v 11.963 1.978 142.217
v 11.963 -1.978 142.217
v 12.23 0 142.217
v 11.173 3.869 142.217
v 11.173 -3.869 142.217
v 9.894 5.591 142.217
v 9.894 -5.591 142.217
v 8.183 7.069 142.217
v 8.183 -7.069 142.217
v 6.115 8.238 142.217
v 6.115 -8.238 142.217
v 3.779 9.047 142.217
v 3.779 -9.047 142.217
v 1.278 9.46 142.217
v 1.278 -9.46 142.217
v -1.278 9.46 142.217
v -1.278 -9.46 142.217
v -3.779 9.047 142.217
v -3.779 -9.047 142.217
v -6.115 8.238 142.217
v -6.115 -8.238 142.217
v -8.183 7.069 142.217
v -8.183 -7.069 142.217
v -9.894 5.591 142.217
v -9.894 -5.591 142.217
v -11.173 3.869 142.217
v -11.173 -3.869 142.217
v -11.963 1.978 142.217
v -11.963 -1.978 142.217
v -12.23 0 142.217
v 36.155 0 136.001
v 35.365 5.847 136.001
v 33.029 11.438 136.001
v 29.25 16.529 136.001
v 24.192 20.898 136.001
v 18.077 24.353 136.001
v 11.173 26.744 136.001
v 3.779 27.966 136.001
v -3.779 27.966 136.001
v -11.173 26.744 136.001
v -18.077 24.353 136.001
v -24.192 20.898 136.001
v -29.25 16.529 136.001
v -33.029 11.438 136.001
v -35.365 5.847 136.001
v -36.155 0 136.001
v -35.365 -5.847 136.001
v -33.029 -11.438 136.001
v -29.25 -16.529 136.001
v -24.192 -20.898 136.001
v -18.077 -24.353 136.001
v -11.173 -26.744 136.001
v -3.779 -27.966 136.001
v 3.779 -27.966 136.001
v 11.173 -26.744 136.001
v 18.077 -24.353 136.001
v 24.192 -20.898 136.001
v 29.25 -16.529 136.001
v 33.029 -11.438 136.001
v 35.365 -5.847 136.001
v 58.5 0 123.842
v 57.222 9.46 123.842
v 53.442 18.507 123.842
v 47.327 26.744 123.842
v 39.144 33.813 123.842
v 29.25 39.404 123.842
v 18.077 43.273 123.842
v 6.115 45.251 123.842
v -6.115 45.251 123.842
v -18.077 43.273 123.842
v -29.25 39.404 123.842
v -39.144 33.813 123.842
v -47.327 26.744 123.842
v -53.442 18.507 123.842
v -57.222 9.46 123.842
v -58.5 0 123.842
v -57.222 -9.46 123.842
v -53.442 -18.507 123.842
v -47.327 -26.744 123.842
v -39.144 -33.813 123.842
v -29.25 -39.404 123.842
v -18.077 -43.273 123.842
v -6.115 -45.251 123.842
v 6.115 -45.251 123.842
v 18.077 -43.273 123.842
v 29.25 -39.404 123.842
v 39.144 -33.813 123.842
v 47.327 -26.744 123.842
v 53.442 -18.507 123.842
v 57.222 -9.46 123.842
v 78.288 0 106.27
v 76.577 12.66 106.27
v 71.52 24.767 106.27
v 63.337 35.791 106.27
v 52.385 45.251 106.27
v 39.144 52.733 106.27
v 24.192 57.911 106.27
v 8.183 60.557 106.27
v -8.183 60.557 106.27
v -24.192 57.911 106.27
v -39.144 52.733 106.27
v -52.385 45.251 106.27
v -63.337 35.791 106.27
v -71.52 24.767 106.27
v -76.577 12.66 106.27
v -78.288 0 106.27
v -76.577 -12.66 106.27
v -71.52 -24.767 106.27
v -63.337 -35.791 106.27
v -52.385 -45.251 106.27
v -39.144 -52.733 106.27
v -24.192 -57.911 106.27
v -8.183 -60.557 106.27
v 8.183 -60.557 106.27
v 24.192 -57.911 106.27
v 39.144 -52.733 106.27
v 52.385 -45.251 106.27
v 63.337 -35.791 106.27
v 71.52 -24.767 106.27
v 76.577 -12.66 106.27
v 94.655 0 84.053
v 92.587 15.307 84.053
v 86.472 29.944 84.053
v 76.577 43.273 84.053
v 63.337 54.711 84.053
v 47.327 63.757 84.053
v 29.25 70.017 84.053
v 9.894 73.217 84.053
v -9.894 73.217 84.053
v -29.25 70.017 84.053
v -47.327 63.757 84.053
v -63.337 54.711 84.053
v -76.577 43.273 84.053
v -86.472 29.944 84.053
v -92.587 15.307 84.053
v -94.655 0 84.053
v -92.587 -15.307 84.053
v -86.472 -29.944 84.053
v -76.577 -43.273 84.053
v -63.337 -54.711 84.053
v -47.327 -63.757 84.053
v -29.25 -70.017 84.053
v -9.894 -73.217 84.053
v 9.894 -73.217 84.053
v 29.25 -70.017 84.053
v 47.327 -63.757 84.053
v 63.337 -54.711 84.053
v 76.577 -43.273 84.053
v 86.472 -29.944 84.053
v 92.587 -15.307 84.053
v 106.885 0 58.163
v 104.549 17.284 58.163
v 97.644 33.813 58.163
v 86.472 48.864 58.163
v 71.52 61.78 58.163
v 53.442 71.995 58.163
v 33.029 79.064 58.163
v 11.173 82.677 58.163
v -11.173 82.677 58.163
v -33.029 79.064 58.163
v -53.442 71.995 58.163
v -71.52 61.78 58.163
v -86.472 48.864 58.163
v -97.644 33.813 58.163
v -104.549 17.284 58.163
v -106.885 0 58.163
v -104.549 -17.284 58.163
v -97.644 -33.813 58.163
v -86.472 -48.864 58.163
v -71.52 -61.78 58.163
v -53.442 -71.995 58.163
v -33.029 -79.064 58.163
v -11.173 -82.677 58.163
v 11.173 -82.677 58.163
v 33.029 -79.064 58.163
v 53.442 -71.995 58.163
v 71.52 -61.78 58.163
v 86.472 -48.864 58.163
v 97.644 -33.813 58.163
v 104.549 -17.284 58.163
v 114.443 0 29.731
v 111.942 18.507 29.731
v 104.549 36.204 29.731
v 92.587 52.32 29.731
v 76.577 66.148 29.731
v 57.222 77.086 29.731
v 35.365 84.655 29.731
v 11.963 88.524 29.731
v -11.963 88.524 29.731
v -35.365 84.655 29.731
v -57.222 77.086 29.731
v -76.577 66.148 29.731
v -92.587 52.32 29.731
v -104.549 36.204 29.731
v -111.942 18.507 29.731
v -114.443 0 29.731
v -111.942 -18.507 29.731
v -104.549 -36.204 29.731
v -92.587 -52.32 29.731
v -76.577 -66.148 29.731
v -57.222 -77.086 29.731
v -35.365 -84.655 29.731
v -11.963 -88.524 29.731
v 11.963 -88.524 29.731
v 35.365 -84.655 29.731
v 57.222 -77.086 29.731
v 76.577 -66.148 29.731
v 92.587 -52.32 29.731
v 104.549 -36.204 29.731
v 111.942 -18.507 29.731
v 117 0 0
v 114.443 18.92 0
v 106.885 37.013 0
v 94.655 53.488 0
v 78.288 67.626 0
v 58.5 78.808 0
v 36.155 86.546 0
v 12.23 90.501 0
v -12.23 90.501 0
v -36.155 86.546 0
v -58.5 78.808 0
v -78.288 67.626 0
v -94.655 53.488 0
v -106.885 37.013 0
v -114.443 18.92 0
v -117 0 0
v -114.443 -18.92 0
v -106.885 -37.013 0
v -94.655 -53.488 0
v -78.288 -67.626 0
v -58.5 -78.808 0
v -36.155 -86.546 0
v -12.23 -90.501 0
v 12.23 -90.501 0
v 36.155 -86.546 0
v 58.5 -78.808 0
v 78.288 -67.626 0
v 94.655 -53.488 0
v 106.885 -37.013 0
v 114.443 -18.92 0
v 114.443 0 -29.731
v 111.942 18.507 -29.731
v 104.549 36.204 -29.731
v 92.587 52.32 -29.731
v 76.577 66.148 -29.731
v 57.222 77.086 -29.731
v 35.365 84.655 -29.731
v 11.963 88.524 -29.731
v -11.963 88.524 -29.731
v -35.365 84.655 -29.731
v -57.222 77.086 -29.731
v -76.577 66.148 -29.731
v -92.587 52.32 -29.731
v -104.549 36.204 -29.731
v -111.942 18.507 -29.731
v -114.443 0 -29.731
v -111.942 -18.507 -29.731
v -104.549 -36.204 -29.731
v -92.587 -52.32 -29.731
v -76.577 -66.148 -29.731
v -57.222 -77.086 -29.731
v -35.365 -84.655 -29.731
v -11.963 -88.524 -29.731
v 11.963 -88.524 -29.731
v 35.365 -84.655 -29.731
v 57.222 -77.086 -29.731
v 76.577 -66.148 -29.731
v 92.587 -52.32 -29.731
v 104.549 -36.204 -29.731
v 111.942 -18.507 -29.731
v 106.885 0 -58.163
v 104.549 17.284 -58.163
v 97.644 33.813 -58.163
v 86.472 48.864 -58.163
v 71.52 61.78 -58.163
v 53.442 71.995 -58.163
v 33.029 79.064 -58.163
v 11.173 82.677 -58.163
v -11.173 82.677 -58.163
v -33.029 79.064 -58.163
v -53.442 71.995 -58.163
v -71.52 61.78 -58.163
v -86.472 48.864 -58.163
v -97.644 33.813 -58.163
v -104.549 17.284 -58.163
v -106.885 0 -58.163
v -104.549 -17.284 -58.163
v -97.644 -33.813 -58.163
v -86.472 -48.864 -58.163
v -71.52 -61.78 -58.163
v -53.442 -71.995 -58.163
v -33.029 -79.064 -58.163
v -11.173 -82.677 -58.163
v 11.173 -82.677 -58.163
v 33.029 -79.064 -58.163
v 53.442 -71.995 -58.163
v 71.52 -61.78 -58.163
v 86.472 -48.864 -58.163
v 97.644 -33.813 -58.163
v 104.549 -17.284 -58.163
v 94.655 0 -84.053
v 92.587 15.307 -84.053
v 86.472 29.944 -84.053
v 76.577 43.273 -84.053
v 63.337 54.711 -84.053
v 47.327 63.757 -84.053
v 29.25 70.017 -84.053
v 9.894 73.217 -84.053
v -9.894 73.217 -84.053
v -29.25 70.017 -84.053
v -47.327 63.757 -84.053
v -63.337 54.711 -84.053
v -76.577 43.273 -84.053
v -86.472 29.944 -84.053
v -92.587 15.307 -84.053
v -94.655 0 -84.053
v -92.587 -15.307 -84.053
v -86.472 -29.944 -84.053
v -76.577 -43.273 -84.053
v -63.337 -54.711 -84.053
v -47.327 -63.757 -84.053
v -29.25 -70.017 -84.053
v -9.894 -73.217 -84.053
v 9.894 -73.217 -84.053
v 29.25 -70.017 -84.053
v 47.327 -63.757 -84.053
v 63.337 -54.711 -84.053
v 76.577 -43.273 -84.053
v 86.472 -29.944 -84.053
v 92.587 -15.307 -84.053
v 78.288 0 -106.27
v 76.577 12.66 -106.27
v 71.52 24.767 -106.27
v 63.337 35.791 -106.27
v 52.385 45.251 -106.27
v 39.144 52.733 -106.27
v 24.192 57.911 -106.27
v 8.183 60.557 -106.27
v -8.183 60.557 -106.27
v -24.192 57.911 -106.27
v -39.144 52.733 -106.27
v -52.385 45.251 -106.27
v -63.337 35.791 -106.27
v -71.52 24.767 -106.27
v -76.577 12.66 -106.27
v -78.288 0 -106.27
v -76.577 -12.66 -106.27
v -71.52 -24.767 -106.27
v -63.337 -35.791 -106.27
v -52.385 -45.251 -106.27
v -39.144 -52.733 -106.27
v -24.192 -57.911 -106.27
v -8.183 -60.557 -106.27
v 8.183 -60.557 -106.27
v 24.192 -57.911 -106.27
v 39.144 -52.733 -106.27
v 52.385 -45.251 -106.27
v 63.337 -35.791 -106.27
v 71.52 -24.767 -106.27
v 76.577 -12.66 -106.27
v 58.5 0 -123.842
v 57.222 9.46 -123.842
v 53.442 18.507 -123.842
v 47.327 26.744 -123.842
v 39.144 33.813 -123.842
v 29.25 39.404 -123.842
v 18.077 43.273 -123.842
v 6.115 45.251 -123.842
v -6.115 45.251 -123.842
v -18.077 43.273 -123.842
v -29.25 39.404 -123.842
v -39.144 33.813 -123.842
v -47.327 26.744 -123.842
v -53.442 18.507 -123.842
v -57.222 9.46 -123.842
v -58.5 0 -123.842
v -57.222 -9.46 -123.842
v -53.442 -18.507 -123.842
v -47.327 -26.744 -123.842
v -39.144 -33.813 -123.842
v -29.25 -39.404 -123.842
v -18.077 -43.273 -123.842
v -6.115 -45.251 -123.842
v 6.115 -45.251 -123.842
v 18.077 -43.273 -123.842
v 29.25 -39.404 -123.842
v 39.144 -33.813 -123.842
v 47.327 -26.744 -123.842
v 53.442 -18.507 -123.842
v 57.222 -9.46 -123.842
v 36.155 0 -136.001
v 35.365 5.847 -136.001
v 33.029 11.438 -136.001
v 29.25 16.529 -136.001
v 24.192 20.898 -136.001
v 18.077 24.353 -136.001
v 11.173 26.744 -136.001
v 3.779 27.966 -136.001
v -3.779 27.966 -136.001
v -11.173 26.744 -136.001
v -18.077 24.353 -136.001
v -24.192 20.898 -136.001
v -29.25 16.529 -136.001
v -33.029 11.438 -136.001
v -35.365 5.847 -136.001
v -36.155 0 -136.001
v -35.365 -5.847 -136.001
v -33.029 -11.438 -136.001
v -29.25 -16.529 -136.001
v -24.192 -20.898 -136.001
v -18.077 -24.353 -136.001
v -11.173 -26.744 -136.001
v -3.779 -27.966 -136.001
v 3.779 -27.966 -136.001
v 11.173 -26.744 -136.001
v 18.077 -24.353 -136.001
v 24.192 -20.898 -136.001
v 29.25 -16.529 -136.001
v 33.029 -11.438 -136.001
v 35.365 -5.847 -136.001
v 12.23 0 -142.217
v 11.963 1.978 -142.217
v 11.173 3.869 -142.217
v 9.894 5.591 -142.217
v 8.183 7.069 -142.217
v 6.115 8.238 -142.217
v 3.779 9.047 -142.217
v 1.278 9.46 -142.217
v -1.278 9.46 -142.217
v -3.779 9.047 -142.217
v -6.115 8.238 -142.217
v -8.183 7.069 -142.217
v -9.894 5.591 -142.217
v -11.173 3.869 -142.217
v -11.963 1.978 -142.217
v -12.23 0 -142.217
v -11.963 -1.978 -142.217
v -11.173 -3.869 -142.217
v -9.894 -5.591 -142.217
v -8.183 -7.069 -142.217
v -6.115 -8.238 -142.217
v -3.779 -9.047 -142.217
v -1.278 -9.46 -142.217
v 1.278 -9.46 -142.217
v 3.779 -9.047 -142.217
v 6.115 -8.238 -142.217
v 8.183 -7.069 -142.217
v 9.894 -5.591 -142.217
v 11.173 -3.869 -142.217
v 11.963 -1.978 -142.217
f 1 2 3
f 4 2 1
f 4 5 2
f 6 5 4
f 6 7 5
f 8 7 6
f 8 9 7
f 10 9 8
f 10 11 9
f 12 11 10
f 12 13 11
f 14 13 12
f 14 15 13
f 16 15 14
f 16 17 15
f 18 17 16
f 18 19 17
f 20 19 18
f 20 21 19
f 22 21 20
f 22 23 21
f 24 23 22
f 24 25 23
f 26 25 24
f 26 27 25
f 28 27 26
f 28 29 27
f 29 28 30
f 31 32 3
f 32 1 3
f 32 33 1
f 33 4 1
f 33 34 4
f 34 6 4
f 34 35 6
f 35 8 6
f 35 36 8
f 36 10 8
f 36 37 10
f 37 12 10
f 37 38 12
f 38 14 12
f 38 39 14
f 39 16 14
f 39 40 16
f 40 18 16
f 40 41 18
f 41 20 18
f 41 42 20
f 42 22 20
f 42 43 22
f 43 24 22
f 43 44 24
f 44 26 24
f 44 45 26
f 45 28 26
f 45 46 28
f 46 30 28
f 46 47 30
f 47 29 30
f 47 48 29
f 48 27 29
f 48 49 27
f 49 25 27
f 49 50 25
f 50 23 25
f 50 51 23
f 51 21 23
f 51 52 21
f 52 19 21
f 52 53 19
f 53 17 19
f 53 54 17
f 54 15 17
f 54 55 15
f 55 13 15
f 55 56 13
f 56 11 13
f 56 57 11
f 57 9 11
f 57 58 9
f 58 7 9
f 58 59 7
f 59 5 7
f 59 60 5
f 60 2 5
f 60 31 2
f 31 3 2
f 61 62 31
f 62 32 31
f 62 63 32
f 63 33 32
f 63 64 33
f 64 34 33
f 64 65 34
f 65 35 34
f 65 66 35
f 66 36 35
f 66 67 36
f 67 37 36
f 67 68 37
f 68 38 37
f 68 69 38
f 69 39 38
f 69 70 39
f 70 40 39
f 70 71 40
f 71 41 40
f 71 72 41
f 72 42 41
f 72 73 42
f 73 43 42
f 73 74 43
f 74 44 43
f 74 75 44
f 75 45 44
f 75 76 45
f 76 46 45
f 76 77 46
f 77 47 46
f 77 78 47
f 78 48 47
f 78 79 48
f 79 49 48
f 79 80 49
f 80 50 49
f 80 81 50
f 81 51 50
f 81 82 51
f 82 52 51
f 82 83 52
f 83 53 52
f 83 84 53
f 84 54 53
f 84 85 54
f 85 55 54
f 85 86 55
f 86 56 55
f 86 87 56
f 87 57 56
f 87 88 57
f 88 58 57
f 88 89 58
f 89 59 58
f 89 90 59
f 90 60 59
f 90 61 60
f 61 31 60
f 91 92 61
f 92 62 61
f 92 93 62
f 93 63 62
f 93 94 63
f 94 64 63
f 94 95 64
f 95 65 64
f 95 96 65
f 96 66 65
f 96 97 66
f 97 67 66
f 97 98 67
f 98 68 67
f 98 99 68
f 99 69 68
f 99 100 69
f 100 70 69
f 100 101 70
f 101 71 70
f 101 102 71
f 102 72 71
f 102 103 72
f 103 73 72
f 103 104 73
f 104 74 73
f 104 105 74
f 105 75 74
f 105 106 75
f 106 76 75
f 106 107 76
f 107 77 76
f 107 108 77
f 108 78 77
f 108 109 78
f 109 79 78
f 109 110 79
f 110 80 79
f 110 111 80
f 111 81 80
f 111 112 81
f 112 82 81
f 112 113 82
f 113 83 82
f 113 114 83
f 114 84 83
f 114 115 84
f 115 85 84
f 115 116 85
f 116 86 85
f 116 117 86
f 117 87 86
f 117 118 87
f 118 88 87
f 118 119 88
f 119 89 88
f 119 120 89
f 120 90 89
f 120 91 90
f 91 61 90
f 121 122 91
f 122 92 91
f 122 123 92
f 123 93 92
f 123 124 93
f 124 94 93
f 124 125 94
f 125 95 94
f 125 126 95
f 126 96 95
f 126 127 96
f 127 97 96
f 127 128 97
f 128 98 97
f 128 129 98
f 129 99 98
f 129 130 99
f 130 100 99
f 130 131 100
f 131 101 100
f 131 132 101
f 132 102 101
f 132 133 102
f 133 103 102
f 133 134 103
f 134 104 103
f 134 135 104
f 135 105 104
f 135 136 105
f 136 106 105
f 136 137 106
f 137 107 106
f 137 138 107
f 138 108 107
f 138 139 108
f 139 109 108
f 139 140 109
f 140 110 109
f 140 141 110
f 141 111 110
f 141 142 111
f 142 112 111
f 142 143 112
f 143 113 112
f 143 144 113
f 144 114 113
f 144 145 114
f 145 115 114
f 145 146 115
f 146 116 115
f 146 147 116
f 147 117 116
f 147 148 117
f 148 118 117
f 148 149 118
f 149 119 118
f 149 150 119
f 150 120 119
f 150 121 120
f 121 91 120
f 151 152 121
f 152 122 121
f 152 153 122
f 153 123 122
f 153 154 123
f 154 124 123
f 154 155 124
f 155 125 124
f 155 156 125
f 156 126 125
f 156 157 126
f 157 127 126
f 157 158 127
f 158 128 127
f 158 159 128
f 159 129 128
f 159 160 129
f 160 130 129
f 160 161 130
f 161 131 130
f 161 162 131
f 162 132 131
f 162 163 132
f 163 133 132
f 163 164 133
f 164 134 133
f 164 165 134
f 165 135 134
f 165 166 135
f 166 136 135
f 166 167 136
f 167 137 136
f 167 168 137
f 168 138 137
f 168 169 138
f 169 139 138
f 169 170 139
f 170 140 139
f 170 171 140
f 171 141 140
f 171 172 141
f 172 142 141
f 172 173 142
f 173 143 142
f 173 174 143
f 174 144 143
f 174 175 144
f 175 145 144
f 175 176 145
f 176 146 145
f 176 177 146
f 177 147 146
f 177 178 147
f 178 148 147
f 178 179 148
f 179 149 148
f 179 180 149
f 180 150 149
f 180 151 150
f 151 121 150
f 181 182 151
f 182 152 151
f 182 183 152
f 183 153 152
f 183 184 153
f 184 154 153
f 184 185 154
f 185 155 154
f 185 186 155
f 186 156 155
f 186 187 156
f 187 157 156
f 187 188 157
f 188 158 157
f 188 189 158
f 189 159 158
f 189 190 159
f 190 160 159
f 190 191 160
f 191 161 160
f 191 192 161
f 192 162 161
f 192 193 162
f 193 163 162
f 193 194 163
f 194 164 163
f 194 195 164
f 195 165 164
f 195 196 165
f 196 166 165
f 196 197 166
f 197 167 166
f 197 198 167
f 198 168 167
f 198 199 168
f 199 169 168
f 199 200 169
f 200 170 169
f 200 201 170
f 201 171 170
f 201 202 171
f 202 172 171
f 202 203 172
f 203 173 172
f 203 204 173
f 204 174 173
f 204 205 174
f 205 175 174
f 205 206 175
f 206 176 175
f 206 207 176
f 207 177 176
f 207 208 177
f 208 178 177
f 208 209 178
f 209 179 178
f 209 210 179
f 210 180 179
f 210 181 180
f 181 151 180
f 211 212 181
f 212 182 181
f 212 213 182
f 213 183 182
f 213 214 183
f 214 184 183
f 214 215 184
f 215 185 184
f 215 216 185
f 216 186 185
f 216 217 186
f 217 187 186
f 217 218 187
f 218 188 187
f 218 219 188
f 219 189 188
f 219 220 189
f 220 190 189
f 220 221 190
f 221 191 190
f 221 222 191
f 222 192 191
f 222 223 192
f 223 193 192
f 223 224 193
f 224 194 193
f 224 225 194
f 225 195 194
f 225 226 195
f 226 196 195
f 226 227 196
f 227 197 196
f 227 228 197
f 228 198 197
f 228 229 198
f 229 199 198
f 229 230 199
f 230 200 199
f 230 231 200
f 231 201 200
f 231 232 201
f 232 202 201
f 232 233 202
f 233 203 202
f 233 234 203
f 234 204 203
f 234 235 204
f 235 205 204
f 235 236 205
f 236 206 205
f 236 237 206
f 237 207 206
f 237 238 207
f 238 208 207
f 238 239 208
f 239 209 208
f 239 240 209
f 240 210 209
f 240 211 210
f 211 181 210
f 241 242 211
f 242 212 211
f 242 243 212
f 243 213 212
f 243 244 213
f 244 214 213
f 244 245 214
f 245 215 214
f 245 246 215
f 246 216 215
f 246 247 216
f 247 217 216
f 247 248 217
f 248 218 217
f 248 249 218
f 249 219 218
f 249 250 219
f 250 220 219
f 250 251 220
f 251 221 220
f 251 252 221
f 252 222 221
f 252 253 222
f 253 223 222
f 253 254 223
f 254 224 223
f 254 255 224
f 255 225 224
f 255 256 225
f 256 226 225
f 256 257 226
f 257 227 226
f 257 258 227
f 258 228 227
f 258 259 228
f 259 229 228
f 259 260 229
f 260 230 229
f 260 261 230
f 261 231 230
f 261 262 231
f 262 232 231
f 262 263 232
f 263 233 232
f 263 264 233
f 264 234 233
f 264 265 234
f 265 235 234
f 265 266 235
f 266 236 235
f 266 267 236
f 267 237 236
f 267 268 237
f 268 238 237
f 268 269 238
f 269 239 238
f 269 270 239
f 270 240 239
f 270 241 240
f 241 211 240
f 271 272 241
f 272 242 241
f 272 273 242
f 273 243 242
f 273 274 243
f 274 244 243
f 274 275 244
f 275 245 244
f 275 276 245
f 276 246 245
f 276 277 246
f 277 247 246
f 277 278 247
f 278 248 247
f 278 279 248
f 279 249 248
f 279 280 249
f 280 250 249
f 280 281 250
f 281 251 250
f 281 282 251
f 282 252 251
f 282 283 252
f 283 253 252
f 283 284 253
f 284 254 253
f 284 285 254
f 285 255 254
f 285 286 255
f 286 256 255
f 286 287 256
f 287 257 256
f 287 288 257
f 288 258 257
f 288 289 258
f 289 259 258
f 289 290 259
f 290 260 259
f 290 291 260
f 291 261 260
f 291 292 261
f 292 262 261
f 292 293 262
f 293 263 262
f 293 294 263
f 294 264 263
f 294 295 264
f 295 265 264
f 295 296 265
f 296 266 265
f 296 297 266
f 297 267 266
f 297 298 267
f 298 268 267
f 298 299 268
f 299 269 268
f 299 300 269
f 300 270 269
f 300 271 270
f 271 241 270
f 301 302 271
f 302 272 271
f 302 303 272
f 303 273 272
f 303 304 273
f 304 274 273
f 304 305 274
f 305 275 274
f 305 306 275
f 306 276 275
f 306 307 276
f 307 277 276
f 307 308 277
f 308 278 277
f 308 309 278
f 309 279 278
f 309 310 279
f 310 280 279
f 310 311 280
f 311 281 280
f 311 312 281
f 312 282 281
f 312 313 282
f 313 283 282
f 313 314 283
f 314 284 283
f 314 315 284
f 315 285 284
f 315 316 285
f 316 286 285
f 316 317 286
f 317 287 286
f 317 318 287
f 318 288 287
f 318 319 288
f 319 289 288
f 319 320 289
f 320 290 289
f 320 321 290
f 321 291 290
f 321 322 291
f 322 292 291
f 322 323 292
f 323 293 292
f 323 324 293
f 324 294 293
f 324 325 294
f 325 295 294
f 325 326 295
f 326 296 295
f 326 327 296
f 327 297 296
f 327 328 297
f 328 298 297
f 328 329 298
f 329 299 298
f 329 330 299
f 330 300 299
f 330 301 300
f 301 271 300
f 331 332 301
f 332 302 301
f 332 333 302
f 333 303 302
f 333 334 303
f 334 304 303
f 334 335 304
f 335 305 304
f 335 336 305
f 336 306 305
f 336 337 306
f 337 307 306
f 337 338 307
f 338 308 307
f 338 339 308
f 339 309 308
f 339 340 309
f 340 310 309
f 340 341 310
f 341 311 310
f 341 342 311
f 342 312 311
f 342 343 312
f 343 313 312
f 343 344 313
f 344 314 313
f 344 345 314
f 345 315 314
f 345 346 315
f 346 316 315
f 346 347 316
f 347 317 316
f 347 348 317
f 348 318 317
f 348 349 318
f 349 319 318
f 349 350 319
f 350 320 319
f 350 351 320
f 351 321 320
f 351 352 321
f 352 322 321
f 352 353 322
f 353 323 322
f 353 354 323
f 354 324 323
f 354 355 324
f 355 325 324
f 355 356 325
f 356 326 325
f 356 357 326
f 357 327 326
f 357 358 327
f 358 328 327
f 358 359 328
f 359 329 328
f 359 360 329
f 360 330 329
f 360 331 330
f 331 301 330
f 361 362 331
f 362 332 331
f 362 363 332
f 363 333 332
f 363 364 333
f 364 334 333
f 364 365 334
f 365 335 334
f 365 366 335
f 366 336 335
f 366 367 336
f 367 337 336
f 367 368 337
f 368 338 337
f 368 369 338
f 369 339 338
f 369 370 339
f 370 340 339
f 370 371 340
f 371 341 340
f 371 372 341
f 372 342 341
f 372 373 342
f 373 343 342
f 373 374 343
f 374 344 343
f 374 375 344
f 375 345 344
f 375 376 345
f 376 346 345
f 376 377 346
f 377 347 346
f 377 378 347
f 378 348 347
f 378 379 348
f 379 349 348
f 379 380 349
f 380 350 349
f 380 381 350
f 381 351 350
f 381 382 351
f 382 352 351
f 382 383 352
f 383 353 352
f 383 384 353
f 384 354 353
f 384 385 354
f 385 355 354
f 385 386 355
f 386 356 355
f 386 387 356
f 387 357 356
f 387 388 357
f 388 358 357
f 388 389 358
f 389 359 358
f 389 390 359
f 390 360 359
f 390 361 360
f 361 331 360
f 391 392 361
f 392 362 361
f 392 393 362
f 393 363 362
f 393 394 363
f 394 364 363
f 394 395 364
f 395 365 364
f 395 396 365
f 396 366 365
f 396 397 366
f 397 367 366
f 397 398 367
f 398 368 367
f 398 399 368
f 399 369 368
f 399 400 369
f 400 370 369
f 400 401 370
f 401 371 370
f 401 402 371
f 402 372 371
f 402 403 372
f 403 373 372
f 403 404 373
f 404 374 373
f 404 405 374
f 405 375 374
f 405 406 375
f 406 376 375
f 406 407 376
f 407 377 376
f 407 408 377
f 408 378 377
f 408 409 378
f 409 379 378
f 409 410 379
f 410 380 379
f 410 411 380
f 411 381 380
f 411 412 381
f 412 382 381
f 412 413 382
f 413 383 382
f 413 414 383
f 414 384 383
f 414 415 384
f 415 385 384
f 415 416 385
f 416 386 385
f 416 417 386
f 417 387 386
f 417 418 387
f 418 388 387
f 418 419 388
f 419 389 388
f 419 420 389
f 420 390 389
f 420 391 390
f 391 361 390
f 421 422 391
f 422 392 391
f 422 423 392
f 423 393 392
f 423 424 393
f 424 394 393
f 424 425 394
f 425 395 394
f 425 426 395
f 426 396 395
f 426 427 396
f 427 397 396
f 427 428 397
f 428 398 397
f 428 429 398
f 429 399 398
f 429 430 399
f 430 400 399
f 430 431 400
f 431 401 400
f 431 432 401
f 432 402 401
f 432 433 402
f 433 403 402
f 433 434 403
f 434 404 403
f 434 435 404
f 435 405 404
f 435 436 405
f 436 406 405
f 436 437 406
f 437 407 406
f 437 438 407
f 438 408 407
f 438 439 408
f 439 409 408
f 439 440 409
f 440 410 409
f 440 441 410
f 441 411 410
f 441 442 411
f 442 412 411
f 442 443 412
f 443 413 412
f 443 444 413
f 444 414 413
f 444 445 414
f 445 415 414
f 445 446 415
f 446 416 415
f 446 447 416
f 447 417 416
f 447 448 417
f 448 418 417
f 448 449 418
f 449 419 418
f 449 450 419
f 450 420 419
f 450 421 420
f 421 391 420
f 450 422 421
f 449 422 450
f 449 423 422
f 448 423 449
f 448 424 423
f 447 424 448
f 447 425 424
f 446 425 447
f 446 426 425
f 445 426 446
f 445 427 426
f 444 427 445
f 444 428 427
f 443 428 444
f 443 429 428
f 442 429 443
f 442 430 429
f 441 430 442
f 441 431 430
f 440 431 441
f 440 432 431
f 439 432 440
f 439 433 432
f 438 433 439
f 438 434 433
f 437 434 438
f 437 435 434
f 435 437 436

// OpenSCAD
// Generated by SolidPython 1.0.1 on 2020-07-29 00:46:48


scale(v = [9, 7, 11]) {
	sphere(r = 13);
}
/***********************************************
*********      SolidPython code:      **********
************************************************
 
# import packages: SolidPython
from solid import *
from solid.utils import *
from itertools import chain, combinations, permutations


class Resize:

    def __init__(self, scad_file):
        self.scad_file = scad_file
        #self.scad_file = import_scad(scad_file)
        # cone/cylinder param:
        self.r1 = 0
        self.r2 = 0
        self.h = 0
        # rectangular prism param:
        self.w = 0
        self.l = 0
        # ellipse param:
        self.r = 0

    # import OpenScad code (file name corresponds to shape)


    # classify shape + parameters
    def assign(self, param1, param2, param3):
        if self.scad_file == 'cone.scad':
            self.r1 = param1
            self.r2 = param2
            self.h = param3
        elif self.scad_file == 'cylinder.scad':
            self.r1 = param1
            self.r2 = param2
            self.h = param3
        elif self.scad_file == 'rectangularPrism.scad':
            self.h = param1
            self.l = param2
            self.w = param3
        else:
            self.r = param1
            self.h = param2

    # resize parameters
    def iterate(self):
        x = range(3, 20, 2)
        i = 1
        if self.scad_file == 'cone.scad':
            tempList = list(permutations(x, 2))
            for temp in tempList:
                param1 = temp[0]
                param2 = temp[1]
                filepath = 'produced_scad_files/' + 'cone' + str(param1) + '_' + str(param2) + '_' + '.scad'
                scad_render_to_file(cylinder(h=param1, r1=param2, r2=0), filepath)

        elif self.scad_file == 'cylinder.scad':
            tempList = list(permutations(x, 3))
            for temp in tempList:
                param1 = temp[0]
                param2 = temp[1]
                filepath = 'produced_scad_files/' + 'cylinder' + str(param1) + '_' + str(param2) + '_' + '.scad'
                scad_render_to_file(cylinder(h=param1, r1=param2, r2=param2), filepath)

        elif self.scad_file == 'rectangularPrism.scad':
            tempList = list(permutations(x, 3))
            for temp in tempList:
                param1 = temp[0]
                param2 = temp[1]
                param3 = temp[2]
                filepath = 'produced_scad_files/' + 'rectangularPrism' + str(param1) + '_' + str(param2) + '_' + str(
                    param3) + '.scad'
                scad_render_to_file(cube(size=(param1, param2, param3)), filepath)

        elif self.scad_file == 'ellipse.scad':
            tempList = list(permutations(x, 4))
            for temp in tempList:
                param1 = temp[0]
                param2 = temp[1]
                param3 = temp[2]
                param4 = temp[3]
                filepath = 'produced_scad_files/' + 'ellipse' + str(param1) + '_' + str(param2) + '_' + str(param3) + '_' + str(param4) + '.scad'
                scad_render_to_file(scale([param1, param2, param3])(sphere(r=param4)), filepath)

    def render_to_scadfile(self):
        scad_render_to_file(scad, 'example.scad') 
 
************************************************/
